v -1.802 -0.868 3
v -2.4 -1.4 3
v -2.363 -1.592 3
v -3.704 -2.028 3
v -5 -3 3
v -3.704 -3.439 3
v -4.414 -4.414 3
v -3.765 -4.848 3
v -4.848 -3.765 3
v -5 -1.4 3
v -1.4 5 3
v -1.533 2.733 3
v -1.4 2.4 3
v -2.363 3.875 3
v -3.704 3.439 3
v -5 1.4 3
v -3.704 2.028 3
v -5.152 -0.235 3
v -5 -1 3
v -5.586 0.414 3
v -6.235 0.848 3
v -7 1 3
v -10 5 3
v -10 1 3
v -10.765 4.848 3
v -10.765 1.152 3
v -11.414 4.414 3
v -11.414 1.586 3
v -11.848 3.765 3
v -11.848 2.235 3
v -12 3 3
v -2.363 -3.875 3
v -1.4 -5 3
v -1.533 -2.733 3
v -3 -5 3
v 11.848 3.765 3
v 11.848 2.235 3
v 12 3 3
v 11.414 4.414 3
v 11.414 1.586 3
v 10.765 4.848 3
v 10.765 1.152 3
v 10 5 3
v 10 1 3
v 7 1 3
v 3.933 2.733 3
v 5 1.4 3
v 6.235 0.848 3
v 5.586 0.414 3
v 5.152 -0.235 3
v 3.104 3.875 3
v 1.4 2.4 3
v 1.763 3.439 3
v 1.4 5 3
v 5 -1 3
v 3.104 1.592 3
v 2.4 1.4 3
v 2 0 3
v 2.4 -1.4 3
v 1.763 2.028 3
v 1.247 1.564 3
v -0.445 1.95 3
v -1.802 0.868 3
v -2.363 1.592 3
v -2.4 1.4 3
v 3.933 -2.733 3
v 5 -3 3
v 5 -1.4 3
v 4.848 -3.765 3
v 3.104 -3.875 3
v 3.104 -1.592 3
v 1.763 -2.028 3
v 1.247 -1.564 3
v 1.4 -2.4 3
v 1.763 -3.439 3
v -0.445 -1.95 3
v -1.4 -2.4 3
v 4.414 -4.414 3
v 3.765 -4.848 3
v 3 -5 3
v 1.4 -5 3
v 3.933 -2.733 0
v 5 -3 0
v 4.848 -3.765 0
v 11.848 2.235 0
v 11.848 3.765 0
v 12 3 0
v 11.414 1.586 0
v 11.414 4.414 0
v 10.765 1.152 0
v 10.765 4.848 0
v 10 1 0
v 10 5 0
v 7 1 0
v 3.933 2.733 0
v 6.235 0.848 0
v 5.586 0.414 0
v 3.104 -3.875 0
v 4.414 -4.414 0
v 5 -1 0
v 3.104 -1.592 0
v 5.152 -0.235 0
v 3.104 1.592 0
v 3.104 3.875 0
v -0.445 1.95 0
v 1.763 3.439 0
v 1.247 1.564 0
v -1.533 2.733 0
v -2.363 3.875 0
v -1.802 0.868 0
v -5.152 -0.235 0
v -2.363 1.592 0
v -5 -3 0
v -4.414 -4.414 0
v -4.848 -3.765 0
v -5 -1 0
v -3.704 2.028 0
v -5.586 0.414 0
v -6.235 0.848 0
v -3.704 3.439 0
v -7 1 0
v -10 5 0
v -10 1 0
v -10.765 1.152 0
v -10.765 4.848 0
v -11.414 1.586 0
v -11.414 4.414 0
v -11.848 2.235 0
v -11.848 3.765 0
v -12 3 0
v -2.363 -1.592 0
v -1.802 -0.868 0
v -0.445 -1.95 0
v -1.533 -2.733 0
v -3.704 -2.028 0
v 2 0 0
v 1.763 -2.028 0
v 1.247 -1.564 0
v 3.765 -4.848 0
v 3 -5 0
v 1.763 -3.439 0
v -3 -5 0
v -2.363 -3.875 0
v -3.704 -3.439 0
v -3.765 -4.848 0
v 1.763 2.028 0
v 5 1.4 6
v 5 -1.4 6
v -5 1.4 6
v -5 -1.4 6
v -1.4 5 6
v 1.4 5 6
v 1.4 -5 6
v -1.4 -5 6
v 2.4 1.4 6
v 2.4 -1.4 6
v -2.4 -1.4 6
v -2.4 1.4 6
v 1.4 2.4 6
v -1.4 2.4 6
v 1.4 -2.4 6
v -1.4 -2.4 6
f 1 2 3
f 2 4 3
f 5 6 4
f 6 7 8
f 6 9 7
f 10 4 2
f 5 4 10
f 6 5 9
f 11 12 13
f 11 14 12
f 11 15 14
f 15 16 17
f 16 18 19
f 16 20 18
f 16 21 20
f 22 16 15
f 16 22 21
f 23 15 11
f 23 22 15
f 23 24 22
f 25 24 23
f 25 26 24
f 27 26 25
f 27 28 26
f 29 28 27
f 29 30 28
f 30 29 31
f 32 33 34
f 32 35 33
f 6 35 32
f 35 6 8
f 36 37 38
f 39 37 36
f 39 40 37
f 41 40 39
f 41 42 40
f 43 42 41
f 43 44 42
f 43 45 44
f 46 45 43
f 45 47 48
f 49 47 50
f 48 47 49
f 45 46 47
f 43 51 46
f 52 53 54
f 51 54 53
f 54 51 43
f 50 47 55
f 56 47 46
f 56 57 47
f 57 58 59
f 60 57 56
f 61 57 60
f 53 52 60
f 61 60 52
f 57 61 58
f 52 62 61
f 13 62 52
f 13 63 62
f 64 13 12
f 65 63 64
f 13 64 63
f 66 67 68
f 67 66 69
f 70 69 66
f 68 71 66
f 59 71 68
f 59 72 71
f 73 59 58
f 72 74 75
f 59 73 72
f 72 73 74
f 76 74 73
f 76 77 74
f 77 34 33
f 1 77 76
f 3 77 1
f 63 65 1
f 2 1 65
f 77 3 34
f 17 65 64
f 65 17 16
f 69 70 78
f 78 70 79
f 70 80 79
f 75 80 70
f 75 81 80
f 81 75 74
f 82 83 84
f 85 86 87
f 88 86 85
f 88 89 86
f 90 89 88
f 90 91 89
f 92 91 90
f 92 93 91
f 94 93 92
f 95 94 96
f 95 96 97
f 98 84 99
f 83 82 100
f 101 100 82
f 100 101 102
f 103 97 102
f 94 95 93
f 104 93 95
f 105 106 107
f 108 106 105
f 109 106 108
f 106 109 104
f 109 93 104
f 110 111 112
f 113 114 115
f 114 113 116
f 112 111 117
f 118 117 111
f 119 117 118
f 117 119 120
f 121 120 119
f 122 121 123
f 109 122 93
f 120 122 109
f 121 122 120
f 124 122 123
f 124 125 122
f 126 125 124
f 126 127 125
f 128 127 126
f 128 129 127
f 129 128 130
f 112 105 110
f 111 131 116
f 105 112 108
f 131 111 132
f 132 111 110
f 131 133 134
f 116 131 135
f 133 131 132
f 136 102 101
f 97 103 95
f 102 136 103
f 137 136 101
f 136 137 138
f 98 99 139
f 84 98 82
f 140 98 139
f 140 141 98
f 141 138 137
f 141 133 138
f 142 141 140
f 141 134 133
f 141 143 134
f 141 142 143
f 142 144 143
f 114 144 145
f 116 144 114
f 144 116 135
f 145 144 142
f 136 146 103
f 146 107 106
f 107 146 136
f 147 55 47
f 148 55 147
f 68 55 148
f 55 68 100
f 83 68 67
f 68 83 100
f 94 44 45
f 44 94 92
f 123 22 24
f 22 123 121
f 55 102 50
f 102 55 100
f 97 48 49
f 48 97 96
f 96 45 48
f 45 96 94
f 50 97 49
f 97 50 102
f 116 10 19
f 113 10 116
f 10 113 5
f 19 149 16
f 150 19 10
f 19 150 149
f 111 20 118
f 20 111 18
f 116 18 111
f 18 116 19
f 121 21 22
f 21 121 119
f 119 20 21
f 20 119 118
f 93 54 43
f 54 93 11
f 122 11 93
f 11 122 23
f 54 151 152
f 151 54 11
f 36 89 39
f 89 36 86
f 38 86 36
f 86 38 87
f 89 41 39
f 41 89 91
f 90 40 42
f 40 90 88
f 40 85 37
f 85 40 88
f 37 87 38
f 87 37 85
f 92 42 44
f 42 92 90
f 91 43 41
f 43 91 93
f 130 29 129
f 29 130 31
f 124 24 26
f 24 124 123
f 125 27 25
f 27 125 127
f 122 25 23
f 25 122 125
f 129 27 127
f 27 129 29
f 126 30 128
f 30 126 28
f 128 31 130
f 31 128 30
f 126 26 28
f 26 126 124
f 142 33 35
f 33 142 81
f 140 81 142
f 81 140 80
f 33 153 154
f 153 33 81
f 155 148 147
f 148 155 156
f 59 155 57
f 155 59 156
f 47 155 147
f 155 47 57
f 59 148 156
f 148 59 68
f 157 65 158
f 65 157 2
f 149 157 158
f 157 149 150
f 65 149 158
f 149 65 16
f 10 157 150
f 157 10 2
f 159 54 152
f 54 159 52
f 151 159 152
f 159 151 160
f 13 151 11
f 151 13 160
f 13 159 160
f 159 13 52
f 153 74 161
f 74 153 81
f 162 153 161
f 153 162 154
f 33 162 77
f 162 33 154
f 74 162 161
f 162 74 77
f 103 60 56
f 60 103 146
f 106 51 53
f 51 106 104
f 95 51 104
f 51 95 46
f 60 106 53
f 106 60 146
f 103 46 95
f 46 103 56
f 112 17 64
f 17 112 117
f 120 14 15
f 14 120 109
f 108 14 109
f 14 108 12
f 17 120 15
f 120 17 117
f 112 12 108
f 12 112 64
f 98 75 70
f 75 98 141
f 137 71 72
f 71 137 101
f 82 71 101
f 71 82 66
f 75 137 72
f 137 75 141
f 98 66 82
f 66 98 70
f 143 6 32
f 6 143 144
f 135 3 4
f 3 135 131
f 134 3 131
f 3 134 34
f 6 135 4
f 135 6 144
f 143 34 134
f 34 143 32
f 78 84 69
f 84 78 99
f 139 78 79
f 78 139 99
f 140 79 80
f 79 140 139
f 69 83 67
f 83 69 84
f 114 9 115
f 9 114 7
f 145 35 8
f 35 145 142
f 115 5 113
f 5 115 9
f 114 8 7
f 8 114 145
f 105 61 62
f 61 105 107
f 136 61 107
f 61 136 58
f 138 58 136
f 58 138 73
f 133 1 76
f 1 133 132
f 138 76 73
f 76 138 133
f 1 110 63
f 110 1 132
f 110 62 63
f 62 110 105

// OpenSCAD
//CUSTOMIZER VARIABLES

/* [Basic_Parameters] */

// end cap thickness, in mm
end_depth = 3.0;    // [1:0.1:10]

// slot tab length, in mm
tab_width = 3.0;    // [2:0.1:20]

// foot length (can be zero), in mm
foot_length = 5.0;    // [0:1:20]

// foot height, in mm
foot_height = 4.0;    // [2:0.5:20]

// Bolt diameter (can be zero), in mm
bolt_diameter = 3.0;    // [0:0.1:20]

// fillet radius, in mm
fillet_radius = 2.0;    // [1:0.1:20]

// hole radius (can be zero), in mm
hole_radius = 1.2;    // [0:0.1:20]

// Makerbeam slot diameter for tight fit, in mm
slot_diameter = 2.8;    // [2:0.1:20]
// varies between 2.8 and 3.1 on different pieces!

// Makerbeam slot distance to edge for tight fit, in mm
tab_height = 2.6;    // [2:0.1:20]

// Makerbeam size, in mm
rail_size = 10;   // [10:50]

//CUSTOMIZER VARIABLES END


// Sanity checks
if( end_depth <= 0 || tab_width <= 0
    || rail_size <= 0 || slot_diameter <= 0)
{
    echo("<B>Error: Missing important parameters</B>");
}


// z depth
main_depth= end_depth;
fillet_size= fillet_radius;


// our object, translated to be flat on xy plane for easy STL generation
translate([0,0,main_depth/2])
    end_cap();

module end_cap(){

    main_width= rail_size;
    main_height= rail_size;
    bolt_length= main_depth+tab_width+5;

    difference() {
      union() {
 
        // the main block
        cube([main_width,main_height,main_depth],center = true);

        // tabs to grip the rail
        tab_dist= main_width/2 - tab_height/2;
        tab_offset= main_depth/2 + tab_width/2;
        translate([tab_dist,0,tab_offset])
          cube([tab_height,slot_diameter,tab_width], center = true);
        translate([-tab_dist,0,tab_offset])
          cube([tab_height,slot_diameter,tab_width], center = true);
        translate([0,tab_dist,tab_offset])
          cube([slot_diameter,tab_height,tab_width], center = true);
        translate([0,-tab_dist,tab_offset])
          cube([slot_diameter,tab_height,tab_width], center = true);
 
        // side pieces to help stabilize the rail on a table
        if (foot_length > 0 && foot_height > 0) {
            translate([0,(main_height-foot_height)/2,0])
              cube([main_width+2*foot_length,foot_height,main_depth], center = true);
            translate([(main_width/2+foot_length),(main_height-foot_height)/2,-main_depth/2])
              cylinder(main_depth,foot_height/2,foot_height/2,$fn=16);
            translate([-(main_width/2+foot_length),(main_height-foot_height)/2,-main_depth/2])
              cylinder(main_depth,foot_height/2,foot_height/2,$fn=16);
              
            // hacky fillet for strength of foot joint
            difference() {
              translate([main_width/2+fillet_size/2,main_height/2-foot_height-fillet_size/2,0])
                cube([fillet_size,fillet_size,main_depth],center = true);
              translate([main_width/2+fillet_size,main_height/2-foot_height-fillet_size,-main_depth/2-1])
                cylinder(main_depth+2,fillet_size,fillet_size,$fn=16);
            }
            difference() {
              translate([-(main_width/2+fillet_size/2),main_height/2-foot_height-fillet_size/2,0])
                cube([fillet_size,fillet_size,main_depth],center = true);
              translate([-(main_width/2+fillet_size),main_height/2-foot_height-fillet_size,-main_depth/2-1])
                cylinder(main_depth+2,fillet_size,fillet_size,$fn=16);
            }
         }
      }

    // optional holes to reduce material usage, allow a little more give on tabs
    if (hole_radius > 0) {
       hole_offset = main_width/3 - hole_radius/2;
       translate([hole_offset,hole_offset,-3])
         cylinder(bolt_length,hole_radius,hole_radius);
       translate([-hole_offset,hole_offset,-3])
         cylinder(bolt_length,hole_radius,hole_radius);
       translate([hole_offset,-hole_offset,-3])
         cylinder(bolt_length,hole_radius,hole_radius);
       translate([-hole_offset,-hole_offset,-3])
         cylinder(bolt_length,hole_radius,hole_radius);
    }

    // hacky fillet to remove sharp corners from top
    corner_x= main_width/2-fillet_size/2;
    corner_y=main_height/2-fillet_size/2;
    cyl_x= main_width/2-fillet_size;
    cyl_y= main_height/2-fillet_size;
    difference() {
      translate([corner_x,-corner_y,0])
        cube([fillet_size,fillet_size,main_depth],center = true);
      translate([cyl_x,-cyl_y,-main_depth/2])
        cylinder(main_depth,fillet_size,fillet_size,$fn=16);
    }
    difference() {
      translate([-corner_x,-corner_y,0])
        cube([fillet_size,fillet_size,main_depth],center = true);
      translate([-cyl_x,-cyl_y,-main_depth/2])
        cylinder(main_depth,fillet_size,fillet_size,$fn=16);
    }
    
    // if no foot, then fillet all 4 corners
   if (foot_length <= 0 || foot_height < 0) {
        difference() {
          translate([corner_x,corner_y,0])
            cube([fillet_size,fillet_size,main_depth],center = true);
          translate([cyl_x,cyl_y,-main_depth/2])
            cylinder(main_depth,fillet_size,fillet_size,$fn=16);
        }
        difference() {
          translate([-corner_x,corner_y,0])
            cube([fillet_size,fillet_size,main_depth],center = true);
          translate([-cyl_x,cyl_y,-main_depth/2])
            cylinder(main_depth,fillet_size,fillet_size,$fn=16);
        }
   }

    // optional hole in center for bolt, also reduces material use
    if (bolt_diameter > 0) {
       bolt_rad= (bolt_diameter+1)/2;
       translate([0,0,-3])
         cylinder(bolt_length,bolt_rad,bolt_rad);
    }
  }

}
